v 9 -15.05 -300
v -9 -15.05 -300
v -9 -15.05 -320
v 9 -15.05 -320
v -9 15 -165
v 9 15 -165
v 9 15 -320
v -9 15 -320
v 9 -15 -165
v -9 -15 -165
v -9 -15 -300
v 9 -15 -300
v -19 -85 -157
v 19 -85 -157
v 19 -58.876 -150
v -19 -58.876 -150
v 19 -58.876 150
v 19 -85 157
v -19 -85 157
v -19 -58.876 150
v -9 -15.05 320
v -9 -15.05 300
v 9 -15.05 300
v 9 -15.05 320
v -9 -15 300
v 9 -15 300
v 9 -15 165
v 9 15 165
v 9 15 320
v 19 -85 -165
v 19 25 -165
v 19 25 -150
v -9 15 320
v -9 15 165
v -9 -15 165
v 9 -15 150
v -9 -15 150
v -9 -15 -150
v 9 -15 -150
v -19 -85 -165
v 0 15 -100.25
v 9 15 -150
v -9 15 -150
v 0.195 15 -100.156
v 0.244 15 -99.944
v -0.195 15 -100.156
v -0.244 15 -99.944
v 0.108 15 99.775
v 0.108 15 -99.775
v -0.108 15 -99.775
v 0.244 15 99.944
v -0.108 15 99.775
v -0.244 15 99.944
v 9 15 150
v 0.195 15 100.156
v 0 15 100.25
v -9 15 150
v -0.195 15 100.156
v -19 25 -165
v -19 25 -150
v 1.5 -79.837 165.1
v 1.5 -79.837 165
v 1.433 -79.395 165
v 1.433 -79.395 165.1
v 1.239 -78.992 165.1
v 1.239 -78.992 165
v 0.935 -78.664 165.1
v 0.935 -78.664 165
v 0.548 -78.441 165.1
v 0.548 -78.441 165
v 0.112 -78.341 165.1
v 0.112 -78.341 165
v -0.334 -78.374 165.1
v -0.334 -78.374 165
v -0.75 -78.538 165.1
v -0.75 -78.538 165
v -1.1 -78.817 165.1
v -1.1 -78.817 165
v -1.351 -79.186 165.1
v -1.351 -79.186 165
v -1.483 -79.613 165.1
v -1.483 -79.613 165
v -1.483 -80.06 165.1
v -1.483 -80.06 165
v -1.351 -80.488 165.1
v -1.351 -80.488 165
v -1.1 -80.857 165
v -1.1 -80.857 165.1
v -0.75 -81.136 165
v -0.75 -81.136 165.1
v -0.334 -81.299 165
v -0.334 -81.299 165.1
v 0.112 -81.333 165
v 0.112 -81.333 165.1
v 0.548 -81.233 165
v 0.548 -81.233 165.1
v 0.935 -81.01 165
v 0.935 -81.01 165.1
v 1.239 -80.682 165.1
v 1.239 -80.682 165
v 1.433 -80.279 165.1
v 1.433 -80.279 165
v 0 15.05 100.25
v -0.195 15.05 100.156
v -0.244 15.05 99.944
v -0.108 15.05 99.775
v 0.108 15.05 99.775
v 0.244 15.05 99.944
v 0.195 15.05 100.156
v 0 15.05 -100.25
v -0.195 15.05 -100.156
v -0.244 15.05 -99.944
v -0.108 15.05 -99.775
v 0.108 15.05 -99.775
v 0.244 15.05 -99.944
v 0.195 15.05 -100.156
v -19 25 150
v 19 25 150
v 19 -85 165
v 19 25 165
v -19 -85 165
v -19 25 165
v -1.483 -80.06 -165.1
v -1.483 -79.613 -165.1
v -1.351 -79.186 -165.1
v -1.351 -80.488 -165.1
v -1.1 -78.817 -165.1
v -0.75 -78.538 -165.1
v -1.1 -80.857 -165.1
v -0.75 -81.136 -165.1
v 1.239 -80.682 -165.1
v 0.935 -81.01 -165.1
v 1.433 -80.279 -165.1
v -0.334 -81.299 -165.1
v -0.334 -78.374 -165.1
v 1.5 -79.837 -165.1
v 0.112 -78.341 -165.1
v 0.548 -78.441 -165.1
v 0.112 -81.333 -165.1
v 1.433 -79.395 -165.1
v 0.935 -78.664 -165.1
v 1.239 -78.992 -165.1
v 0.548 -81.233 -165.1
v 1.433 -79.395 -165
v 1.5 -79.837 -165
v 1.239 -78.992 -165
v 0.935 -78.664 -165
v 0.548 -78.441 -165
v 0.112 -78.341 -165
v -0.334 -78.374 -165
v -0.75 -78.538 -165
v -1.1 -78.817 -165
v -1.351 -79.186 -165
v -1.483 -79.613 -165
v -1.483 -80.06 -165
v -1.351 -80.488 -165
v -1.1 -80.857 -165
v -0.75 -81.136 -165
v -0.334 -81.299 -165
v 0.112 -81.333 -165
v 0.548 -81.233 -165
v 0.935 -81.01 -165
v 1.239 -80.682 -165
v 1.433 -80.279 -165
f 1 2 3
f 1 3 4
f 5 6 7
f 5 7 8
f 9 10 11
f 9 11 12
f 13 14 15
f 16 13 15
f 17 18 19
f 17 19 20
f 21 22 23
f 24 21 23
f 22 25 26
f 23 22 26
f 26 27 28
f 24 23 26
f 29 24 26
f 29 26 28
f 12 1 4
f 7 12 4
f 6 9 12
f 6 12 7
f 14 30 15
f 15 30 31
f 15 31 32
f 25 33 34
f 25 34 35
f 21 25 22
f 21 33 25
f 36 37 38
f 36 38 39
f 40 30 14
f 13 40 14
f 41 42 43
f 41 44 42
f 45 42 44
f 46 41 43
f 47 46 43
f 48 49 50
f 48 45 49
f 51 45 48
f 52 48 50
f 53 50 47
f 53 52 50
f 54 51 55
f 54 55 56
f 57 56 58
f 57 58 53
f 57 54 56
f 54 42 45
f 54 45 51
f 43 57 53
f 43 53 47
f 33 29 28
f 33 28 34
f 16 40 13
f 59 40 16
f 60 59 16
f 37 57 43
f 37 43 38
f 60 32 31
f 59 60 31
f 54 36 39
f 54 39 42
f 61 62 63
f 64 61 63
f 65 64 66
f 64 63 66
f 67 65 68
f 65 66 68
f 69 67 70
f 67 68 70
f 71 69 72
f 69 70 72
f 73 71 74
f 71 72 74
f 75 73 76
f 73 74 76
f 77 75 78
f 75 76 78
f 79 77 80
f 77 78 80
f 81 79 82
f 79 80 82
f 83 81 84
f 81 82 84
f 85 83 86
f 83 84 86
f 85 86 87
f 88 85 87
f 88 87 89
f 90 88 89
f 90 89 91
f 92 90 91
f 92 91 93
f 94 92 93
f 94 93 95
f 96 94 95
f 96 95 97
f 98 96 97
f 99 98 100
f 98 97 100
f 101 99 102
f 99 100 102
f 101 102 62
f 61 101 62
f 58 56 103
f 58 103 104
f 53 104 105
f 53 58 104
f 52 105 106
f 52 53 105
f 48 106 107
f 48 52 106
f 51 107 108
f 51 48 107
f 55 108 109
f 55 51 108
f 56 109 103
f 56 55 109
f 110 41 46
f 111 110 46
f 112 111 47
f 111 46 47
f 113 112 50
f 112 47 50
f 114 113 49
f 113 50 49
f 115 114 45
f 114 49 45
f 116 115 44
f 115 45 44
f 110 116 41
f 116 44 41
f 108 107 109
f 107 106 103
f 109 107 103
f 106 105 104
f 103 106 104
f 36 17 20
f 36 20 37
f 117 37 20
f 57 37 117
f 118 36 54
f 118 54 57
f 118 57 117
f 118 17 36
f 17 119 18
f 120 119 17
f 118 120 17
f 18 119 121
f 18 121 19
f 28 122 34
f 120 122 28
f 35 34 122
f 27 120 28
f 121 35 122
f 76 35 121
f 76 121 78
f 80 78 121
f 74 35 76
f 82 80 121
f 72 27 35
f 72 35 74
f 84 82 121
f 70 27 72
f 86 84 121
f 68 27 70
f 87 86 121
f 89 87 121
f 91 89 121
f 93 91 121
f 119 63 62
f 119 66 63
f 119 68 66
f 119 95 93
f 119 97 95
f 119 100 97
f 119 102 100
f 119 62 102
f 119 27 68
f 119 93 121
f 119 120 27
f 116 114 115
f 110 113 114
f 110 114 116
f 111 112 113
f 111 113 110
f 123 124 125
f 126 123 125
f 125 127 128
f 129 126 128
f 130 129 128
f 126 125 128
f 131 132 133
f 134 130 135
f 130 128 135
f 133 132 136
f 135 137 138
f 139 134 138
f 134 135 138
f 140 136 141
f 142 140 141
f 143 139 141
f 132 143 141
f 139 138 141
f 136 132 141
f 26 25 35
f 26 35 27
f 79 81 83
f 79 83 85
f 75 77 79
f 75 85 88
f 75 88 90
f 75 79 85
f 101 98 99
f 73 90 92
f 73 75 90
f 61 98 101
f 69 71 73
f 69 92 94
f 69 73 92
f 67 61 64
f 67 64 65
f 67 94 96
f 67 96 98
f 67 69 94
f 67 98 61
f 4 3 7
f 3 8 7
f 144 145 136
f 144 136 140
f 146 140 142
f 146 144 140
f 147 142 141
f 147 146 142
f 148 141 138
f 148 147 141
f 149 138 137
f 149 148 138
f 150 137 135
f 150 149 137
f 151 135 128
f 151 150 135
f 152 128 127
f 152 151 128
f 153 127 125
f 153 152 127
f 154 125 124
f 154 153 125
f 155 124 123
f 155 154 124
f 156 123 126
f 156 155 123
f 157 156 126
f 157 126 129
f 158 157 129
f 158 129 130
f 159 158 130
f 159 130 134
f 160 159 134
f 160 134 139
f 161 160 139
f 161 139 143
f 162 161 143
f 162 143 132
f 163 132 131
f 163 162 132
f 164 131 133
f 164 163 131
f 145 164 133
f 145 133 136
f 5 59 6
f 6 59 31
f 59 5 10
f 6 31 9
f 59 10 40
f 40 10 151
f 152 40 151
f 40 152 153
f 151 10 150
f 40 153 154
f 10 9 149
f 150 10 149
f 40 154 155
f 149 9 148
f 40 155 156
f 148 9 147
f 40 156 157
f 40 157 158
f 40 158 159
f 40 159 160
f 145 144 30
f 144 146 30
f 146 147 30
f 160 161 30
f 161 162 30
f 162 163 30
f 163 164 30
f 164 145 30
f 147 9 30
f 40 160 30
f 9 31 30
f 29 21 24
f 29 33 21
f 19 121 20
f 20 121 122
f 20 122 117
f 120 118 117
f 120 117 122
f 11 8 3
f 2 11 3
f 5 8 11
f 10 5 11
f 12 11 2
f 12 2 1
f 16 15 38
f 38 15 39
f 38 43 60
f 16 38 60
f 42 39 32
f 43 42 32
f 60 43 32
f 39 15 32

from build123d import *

# Parameters (mm, degrees)
SKETCH_1_W      = 18
SKETCH_1_H      = 30
EXTRUDE_1_DEPTH = 300
EXTRUDE_2_DEPTH = 20
EXTRUDE_3_DEPTH = 38
SKETCH_6_R      = 0.25
EXTRUDE_4_DEPTH = 0.05
SKETCH_8_R      = 1.5
EXTRUDE_5_DEPTH = 0.1


with BuildPart() as part:
    # 草图1 → 凸台-拉伸1 (new, symmetric)
    with BuildSketch(Plane.XY):
        Rectangle(SKETCH_1_W, SKETCH_1_H)
    extrude(amount=EXTRUDE_1_DEPTH, both=True)

    # 草图3 → 凸台-拉伸2 (add)
    with BuildSketch(Plane.XY.offset(300)):
        Polygon((-9, -15), (-9, -15.05), (9, -15.05), (9, -15), (9, 15), (-9, 15), align=None)
    extrude_2 = extrude(amount=EXTRUDE_2_DEPTH)

    # 镜向1: 凸台-拉伸2 across plane
    add(extrude_2.mirror(Plane.XY))

    # 草图5 → 凸台-拉伸3 (add)
    with BuildSketch(Plane(origin=(19, 0, 0), x_dir=(0, 0, -1), z_dir=(1, 0, 0))):
        Polygon((-165, 25), (-165, -85), (-157, -85), (-150, -58.875644347), (-150, 25), align=None)
    extrude_3 = extrude(amount=-EXTRUDE_3_DEPTH)

    # 镜向2: 凸台-拉伸3 across plane
    add(extrude_3.mirror(Plane.XY))

    # 草图6 → 凸台-拉伸4 (add)
    with BuildSketch(Plane(origin=(0, 15, 0), x_dir=(1, 0, 0), z_dir=(0, 1, 0))):
        with Locations(Location((0, 100, 0), (0, 0, 90))):
            Circle(SKETCH_6_R)
    extrude_4 = extrude(amount=EXTRUDE_4_DEPTH)

    # 镜向3: 凸台-拉伸4 across plane
    add(extrude_4.mirror(Plane.XY))

    # 草图8 → 凸台-拉伸5 (add)
    with BuildSketch(Plane(origin=(0, -26.505017173, 165), x_dir=(1, 0, 0), z_dir=(0, 0, 1))):
        with Locations((0, -53.331799003)):
            Circle(SKETCH_8_R)
    extrude_5 = extrude(amount=EXTRUDE_5_DEPTH)

    # 镜向4: 凸台-拉伸5 across plane
    add(extrude_5.mirror(Plane.XY))


solid = part.part
